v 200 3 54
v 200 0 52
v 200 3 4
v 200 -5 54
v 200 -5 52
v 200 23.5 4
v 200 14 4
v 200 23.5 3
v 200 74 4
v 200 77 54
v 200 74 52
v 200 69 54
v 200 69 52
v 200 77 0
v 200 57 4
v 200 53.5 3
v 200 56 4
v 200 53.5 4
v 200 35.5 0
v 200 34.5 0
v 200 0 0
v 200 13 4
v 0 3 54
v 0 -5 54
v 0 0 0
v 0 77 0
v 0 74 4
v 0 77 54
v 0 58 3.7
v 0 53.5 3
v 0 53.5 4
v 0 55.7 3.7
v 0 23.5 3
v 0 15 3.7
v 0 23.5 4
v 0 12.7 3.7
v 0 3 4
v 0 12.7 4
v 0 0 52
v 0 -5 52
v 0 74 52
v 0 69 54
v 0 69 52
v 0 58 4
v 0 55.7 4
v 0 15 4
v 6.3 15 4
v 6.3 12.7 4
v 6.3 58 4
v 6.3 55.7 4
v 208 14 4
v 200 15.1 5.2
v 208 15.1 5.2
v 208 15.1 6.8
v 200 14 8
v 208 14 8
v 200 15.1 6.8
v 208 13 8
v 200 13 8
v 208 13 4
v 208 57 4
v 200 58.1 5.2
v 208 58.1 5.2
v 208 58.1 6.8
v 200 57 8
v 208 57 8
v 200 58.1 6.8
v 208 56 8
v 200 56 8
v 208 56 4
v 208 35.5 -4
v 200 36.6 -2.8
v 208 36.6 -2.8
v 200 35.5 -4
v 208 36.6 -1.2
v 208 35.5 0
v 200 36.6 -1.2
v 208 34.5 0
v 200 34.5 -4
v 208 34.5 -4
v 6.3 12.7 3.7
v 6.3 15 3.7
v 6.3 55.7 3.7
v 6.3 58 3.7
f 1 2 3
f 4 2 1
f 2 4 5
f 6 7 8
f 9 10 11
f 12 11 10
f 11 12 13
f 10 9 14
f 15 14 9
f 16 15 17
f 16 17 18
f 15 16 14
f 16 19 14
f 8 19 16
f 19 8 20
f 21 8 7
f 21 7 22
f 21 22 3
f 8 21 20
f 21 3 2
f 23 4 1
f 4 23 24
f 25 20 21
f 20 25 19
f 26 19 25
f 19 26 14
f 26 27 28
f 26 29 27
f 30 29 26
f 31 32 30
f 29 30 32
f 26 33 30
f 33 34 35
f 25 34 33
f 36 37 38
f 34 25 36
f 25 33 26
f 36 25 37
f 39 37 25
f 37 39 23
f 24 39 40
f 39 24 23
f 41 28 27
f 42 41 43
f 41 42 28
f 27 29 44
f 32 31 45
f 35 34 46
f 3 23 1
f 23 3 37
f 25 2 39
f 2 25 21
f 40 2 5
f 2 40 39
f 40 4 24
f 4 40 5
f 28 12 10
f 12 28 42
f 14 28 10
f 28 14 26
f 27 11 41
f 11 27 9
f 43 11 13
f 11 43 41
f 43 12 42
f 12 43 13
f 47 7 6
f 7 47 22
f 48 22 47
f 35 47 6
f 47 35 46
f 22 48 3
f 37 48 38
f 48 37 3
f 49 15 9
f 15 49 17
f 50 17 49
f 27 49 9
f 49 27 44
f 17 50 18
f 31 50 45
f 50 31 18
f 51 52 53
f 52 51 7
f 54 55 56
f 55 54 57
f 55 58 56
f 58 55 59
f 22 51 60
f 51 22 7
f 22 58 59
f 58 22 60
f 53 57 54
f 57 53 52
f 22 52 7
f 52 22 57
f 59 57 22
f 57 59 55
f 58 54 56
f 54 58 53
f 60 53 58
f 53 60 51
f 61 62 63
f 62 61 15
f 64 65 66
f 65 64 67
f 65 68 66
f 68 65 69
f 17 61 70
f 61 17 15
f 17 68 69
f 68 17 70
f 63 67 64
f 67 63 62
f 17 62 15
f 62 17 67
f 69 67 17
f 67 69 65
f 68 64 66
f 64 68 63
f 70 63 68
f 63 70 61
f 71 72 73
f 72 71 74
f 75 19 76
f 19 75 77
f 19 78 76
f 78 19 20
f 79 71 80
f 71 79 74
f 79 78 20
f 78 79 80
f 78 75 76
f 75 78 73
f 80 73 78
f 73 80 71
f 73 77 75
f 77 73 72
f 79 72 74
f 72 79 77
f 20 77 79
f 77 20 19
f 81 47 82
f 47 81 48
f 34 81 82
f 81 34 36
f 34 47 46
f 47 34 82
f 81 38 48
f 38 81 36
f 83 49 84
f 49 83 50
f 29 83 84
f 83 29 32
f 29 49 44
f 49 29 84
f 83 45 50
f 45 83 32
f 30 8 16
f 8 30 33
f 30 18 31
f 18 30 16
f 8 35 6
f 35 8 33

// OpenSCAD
// file: common.scad
// ============================================================
// FBA Prep Machine - Common Parameters
// All dimensions in millimeters
// ============================================================

// --- Texjoy Bottle Dimensions (16oz) ---
BOTTLE_WIDTH   = 65;    // X dimension (front-to-back)
BOTTLE_DEPTH   = 65;    // Y dimension (side-to-side)
BOTTLE_HEIGHT  = 170;   // Z dimension (cap to base)
BOTTLE_CLEARANCE = 3;   // Extra gap per side for easy sliding

// Derived chute dimensions
CHUTE_WIDTH    = BOTTLE_WIDTH + BOTTLE_CLEARANCE * 2;   // 71mm
CHUTE_DEPTH    = BOTTLE_DEPTH + BOTTLE_CLEARANCE * 2;   // 71mm
CHUTE_WALL     = 3;     // Wall thickness
CHUTE_HEIGHT   = 50;    // Wall height (doesn't need to be full bottle height)

// --- Hardware Dimensions ---
// NEMA 17 Stepper Motor
NEMA17_SIZE     = 42.3;
NEMA17_HOLE_SPACING = 31;
NEMA17_SHAFT_DIA    = 5;
NEMA17_BOSS_DIA     = 22;
NEMA17_SCREW_DIA    = 3.2;  // M3 clearance

// A4988 Stepper Driver
A4988_WIDTH  = 20.5;
A4988_LENGTH = 15.5;

// ESP32 DevKit V1
ESP32_WIDTH  = 28;
ESP32_LENGTH = 52;
ESP32_HEIGHT = 8;

// GM65 Barcode Scanner Module
GM65_WIDTH   = 20.5;
GM65_LENGTH  = 34;
GM65_HEIGHT  = 18;

// IR LED / Photodiode (5mm)
IR_LED_DIA   = 5.2;

// Servo (SG90/MG90S)
SERVO_WIDTH  = 12.5;
SERVO_LENGTH = 23;
SERVO_HEIGHT = 22;
SERVO_TAB_WIDTH = 32.5;
SERVO_SCREW_SPACING = 28;

// Nichrome Wire
NICHROME_DIA = 1.0;

// --- Fastener Dimensions ---
M3_DIA       = 3.2;
M3_HEAD_DIA  = 5.8;
M3_NUT_W     = 5.5;
M3_NUT_H     = 2.4;

M4_DIA       = 4.2;
M4_HEAD_DIA  = 7.2;

// --- Snap-Fit Parameters ---
SNAP_WIDTH     = 8;
SNAP_HEIGHT    = 4;
SNAP_DEPTH     = 2;
SNAP_TOLERANCE = 0.3;

// --- Print Settings ---
LAYER_HEIGHT  = 0.2;
NOZZLE_DIA    = 0.4;
$fn = 40;  // Circle resolution

// --- Helper Modules ---

// Rounded rectangle
module rounded_rect(w, d, h, r=2) {
    hull() {
        for (x = [r, w-r])
            for (y = [r, d-r])
                translate([x, y, 0])
                    cylinder(h=h, r=r);
    }
}

// M3 screw hole (through)
module m3_hole(h=10) {
    cylinder(d=M3_DIA, h=h);
}

// M3 counterbore
module m3_counterbore(h=10, cb_depth=3) {
    cylinder(d=M3_DIA, h=h);
    cylinder(d=M3_HEAD_DIA, h=cb_depth);
}

// M3 nut trap (hexagonal)
module m3_nut_trap(h=M3_NUT_H) {
    cylinder(d=M3_NUT_W / cos(30), h=h, $fn=6);
}

// Snap-fit tab (male)
module snap_tab() {
    // Tapered tab for snap-fit connection
    hull() {
        cube([SNAP_WIDTH, SNAP_DEPTH * 0.5, SNAP_HEIGHT]);
        translate([0, SNAP_DEPTH, SNAP_HEIGHT * 0.3])
            cube([SNAP_WIDTH, 0.1, SNAP_HEIGHT * 0.4]);
    }
}

// Snap-fit slot (female)
module snap_slot() {
    cube([SNAP_WIDTH + SNAP_TOLERANCE*2,
          SNAP_DEPTH + SNAP_TOLERANCE,
          SNAP_HEIGHT + SNAP_TOLERANCE*2]);
}
// main file
// ============================================================
// FBA Prep Machine - Modular Bottle Chute Section
// Snap-together track sections for guiding bottles between stations
// Print: 0.2mm layers, 3 walls, 20% infill, PLA or PETG
// ============================================================

use <common.scad>
include <common.scad>

// --- Chute Section Parameters ---
SECTION_LENGTH = 200;       // Length of one chute section
BASE_THICKNESS = 4;         // Floor thickness
RAIL_HEIGHT    = CHUTE_HEIGHT; // Side wall height (50mm)
RAIL_TAPER     = 5;         // Outward taper at top for easy bottle entry

// Slope for gravity feed (adjustable via printed riser blocks)
SLOPE_DROP     = 0;         // Set >0 for gravity-fed slope per section

// --- Main Chute Section ---
module chute_section() {
    difference() {
        union() {
            // Base plate
            cube([SECTION_LENGTH, CHUTE_DEPTH + CHUTE_WALL*2, BASE_THICKNESS]);

            // Left wall
            translate([0, 0, 0])
                chute_wall();

            // Right wall
            translate([0, CHUTE_DEPTH + CHUTE_WALL, 0])
                chute_wall();

            // Male snap tabs on output end (right side)
            translate([SECTION_LENGTH, CHUTE_WALL + 10, BASE_THICKNESS])
                snap_tab();
            translate([SECTION_LENGTH, CHUTE_DEPTH + CHUTE_WALL - 10 - SNAP_WIDTH, BASE_THICKNESS])
                snap_tab();

            // Bottom snap tabs
            translate([SECTION_LENGTH, CHUTE_WALL + CHUTE_DEPTH/2 - SNAP_WIDTH/2, 0])
                rotate([0, 0, 0])
                    translate([0, 0, -SNAP_HEIGHT])
                        snap_tab();
        }

        // Female snap slots on input end (left side)
        translate([-SNAP_DEPTH - SNAP_TOLERANCE, CHUTE_WALL + 10 - SNAP_TOLERANCE, BASE_THICKNESS - SNAP_TOLERANCE])
            snap_slot();
        translate([-SNAP_DEPTH - SNAP_TOLERANCE, CHUTE_DEPTH + CHUTE_WALL - 10 - SNAP_WIDTH - SNAP_TOLERANCE, BASE_THICKNESS - SNAP_TOLERANCE])
            snap_slot();

        // Channel groove in base for smoother sliding
        translate([0, CHUTE_WALL + CHUTE_DEPTH/2 - 15, BASE_THICKNESS - 1])
            cube([SECTION_LENGTH, 30, 1.5]);
    }
}

// Single chute wall with taper
module chute_wall() {
    // Main wall
    cube([SECTION_LENGTH, CHUTE_WALL, BASE_THICKNESS + RAIL_HEIGHT]);

    // Taper flare at top (helps bottles enter)
    translate([0, -RAIL_TAPER, BASE_THICKNESS + RAIL_HEIGHT - 2])
        cube([SECTION_LENGTH, CHUTE_WALL + RAIL_TAPER, 2]);
}

// --- Curved Section (90-degree turn) ---
module chute_curve(radius=150, angle=90) {
    curve_steps = 20;
    step_angle = angle / curve_steps;

    for (i = [0:curve_steps-1]) {
        hull() {
            rotate([0, 0, i * step_angle])
                translate([radius, 0, 0])
                    cube([CHUTE_DEPTH + CHUTE_WALL*2, 2, BASE_THICKNESS + RAIL_HEIGHT]);
            rotate([0, 0, (i+1) * step_angle])
                translate([radius, 0, 0])
                    cube([CHUTE_DEPTH + CHUTE_WALL*2, 2, BASE_THICKNESS + RAIL_HEIGHT]);
        }
    }
}

// --- Riser Block (for gravity slope) ---
module riser_block(height=10) {
    difference() {
        cube([CHUTE_DEPTH + CHUTE_WALL*2 + 10, 30, height]);

        // Screw holes to attach to table
        translate([10, 15, 0])
            m3_hole(height);
        translate([CHUTE_DEPTH + CHUTE_WALL*2, 15, 0])
            m3_hole(height);
    }
}

// --- Station Stop Gate ---
// Blocks bottle at a station, servo-actuated release
module stop_gate() {
    gate_width = CHUTE_DEPTH + CHUTE_WALL * 2;

    difference() {
        union() {
            // Gate frame that sits on top of chute walls
            cube([gate_width, 15, RAIL_HEIGHT + 15]);

            // Servo mount tab
            translate([-SERVO_LENGTH - 5, 0, RAIL_HEIGHT])
                servo_mount();
        }

        // Channel for gate blade to slide
        translate([CHUTE_WALL - 1, 5, 0])
            cube([CHUTE_DEPTH + 2, 3, RAIL_HEIGHT + 5]);

        // Slot for the chute walls
        translate([0, 0, 0])
            cube([CHUTE_WALL + 0.5, 15, RAIL_HEIGHT]);
        translate([CHUTE_WALL + CHUTE_DEPTH - 0.5, 0, 0])
            cube([CHUTE_WALL + 0.5, 15, RAIL_HEIGHT]);
    }
}

// Gate blade (the part that actually blocks the bottle)
module gate_blade() {
    difference() {
        union() {
            // Blade
            cube([CHUTE_DEPTH - 2, 2.5, RAIL_HEIGHT]);

            // Arm extending up to connect to servo horn
            translate([CHUTE_DEPTH/2 - 5, 0, RAIL_HEIGHT])
                cube([10, 2.5, 20]);
        }

        // Servo horn connection hole
        translate([CHUTE_DEPTH/2, -1, RAIL_HEIGHT + 15])
            rotate([-90, 0, 0])
                cylinder(d=2, h=5);
    }
}

// Servo mount bracket
module servo_mount() {
    difference() {
        cube([SERVO_LENGTH + 4, 15, SERVO_HEIGHT + 6]);

        // Servo body cutout
        translate([2, 2, 3])
            cube([SERVO_LENGTH, 13, SERVO_HEIGHT]);

        // Servo tab screw holes
        translate([(SERVO_LENGTH + 4)/2 - SERVO_SCREW_SPACING/2, 7.5, 0])
            m3_hole(3);
        translate([(SERVO_LENGTH + 4)/2 + SERVO_SCREW_SPACING/2, 7.5, 0])
            m3_hole(3);
    }
}

// --- Render ---
// Uncomment the part you want to render/export:

chute_section();

// translate([0, -50, 0]) stop_gate();
// translate([0, -80, 0]) gate_blade();
// translate([0, -110, 0]) riser_block(10);
// translate([0, -130, 0]) riser_block(20);
// translate([0, -150, 0]) riser_block(30);
